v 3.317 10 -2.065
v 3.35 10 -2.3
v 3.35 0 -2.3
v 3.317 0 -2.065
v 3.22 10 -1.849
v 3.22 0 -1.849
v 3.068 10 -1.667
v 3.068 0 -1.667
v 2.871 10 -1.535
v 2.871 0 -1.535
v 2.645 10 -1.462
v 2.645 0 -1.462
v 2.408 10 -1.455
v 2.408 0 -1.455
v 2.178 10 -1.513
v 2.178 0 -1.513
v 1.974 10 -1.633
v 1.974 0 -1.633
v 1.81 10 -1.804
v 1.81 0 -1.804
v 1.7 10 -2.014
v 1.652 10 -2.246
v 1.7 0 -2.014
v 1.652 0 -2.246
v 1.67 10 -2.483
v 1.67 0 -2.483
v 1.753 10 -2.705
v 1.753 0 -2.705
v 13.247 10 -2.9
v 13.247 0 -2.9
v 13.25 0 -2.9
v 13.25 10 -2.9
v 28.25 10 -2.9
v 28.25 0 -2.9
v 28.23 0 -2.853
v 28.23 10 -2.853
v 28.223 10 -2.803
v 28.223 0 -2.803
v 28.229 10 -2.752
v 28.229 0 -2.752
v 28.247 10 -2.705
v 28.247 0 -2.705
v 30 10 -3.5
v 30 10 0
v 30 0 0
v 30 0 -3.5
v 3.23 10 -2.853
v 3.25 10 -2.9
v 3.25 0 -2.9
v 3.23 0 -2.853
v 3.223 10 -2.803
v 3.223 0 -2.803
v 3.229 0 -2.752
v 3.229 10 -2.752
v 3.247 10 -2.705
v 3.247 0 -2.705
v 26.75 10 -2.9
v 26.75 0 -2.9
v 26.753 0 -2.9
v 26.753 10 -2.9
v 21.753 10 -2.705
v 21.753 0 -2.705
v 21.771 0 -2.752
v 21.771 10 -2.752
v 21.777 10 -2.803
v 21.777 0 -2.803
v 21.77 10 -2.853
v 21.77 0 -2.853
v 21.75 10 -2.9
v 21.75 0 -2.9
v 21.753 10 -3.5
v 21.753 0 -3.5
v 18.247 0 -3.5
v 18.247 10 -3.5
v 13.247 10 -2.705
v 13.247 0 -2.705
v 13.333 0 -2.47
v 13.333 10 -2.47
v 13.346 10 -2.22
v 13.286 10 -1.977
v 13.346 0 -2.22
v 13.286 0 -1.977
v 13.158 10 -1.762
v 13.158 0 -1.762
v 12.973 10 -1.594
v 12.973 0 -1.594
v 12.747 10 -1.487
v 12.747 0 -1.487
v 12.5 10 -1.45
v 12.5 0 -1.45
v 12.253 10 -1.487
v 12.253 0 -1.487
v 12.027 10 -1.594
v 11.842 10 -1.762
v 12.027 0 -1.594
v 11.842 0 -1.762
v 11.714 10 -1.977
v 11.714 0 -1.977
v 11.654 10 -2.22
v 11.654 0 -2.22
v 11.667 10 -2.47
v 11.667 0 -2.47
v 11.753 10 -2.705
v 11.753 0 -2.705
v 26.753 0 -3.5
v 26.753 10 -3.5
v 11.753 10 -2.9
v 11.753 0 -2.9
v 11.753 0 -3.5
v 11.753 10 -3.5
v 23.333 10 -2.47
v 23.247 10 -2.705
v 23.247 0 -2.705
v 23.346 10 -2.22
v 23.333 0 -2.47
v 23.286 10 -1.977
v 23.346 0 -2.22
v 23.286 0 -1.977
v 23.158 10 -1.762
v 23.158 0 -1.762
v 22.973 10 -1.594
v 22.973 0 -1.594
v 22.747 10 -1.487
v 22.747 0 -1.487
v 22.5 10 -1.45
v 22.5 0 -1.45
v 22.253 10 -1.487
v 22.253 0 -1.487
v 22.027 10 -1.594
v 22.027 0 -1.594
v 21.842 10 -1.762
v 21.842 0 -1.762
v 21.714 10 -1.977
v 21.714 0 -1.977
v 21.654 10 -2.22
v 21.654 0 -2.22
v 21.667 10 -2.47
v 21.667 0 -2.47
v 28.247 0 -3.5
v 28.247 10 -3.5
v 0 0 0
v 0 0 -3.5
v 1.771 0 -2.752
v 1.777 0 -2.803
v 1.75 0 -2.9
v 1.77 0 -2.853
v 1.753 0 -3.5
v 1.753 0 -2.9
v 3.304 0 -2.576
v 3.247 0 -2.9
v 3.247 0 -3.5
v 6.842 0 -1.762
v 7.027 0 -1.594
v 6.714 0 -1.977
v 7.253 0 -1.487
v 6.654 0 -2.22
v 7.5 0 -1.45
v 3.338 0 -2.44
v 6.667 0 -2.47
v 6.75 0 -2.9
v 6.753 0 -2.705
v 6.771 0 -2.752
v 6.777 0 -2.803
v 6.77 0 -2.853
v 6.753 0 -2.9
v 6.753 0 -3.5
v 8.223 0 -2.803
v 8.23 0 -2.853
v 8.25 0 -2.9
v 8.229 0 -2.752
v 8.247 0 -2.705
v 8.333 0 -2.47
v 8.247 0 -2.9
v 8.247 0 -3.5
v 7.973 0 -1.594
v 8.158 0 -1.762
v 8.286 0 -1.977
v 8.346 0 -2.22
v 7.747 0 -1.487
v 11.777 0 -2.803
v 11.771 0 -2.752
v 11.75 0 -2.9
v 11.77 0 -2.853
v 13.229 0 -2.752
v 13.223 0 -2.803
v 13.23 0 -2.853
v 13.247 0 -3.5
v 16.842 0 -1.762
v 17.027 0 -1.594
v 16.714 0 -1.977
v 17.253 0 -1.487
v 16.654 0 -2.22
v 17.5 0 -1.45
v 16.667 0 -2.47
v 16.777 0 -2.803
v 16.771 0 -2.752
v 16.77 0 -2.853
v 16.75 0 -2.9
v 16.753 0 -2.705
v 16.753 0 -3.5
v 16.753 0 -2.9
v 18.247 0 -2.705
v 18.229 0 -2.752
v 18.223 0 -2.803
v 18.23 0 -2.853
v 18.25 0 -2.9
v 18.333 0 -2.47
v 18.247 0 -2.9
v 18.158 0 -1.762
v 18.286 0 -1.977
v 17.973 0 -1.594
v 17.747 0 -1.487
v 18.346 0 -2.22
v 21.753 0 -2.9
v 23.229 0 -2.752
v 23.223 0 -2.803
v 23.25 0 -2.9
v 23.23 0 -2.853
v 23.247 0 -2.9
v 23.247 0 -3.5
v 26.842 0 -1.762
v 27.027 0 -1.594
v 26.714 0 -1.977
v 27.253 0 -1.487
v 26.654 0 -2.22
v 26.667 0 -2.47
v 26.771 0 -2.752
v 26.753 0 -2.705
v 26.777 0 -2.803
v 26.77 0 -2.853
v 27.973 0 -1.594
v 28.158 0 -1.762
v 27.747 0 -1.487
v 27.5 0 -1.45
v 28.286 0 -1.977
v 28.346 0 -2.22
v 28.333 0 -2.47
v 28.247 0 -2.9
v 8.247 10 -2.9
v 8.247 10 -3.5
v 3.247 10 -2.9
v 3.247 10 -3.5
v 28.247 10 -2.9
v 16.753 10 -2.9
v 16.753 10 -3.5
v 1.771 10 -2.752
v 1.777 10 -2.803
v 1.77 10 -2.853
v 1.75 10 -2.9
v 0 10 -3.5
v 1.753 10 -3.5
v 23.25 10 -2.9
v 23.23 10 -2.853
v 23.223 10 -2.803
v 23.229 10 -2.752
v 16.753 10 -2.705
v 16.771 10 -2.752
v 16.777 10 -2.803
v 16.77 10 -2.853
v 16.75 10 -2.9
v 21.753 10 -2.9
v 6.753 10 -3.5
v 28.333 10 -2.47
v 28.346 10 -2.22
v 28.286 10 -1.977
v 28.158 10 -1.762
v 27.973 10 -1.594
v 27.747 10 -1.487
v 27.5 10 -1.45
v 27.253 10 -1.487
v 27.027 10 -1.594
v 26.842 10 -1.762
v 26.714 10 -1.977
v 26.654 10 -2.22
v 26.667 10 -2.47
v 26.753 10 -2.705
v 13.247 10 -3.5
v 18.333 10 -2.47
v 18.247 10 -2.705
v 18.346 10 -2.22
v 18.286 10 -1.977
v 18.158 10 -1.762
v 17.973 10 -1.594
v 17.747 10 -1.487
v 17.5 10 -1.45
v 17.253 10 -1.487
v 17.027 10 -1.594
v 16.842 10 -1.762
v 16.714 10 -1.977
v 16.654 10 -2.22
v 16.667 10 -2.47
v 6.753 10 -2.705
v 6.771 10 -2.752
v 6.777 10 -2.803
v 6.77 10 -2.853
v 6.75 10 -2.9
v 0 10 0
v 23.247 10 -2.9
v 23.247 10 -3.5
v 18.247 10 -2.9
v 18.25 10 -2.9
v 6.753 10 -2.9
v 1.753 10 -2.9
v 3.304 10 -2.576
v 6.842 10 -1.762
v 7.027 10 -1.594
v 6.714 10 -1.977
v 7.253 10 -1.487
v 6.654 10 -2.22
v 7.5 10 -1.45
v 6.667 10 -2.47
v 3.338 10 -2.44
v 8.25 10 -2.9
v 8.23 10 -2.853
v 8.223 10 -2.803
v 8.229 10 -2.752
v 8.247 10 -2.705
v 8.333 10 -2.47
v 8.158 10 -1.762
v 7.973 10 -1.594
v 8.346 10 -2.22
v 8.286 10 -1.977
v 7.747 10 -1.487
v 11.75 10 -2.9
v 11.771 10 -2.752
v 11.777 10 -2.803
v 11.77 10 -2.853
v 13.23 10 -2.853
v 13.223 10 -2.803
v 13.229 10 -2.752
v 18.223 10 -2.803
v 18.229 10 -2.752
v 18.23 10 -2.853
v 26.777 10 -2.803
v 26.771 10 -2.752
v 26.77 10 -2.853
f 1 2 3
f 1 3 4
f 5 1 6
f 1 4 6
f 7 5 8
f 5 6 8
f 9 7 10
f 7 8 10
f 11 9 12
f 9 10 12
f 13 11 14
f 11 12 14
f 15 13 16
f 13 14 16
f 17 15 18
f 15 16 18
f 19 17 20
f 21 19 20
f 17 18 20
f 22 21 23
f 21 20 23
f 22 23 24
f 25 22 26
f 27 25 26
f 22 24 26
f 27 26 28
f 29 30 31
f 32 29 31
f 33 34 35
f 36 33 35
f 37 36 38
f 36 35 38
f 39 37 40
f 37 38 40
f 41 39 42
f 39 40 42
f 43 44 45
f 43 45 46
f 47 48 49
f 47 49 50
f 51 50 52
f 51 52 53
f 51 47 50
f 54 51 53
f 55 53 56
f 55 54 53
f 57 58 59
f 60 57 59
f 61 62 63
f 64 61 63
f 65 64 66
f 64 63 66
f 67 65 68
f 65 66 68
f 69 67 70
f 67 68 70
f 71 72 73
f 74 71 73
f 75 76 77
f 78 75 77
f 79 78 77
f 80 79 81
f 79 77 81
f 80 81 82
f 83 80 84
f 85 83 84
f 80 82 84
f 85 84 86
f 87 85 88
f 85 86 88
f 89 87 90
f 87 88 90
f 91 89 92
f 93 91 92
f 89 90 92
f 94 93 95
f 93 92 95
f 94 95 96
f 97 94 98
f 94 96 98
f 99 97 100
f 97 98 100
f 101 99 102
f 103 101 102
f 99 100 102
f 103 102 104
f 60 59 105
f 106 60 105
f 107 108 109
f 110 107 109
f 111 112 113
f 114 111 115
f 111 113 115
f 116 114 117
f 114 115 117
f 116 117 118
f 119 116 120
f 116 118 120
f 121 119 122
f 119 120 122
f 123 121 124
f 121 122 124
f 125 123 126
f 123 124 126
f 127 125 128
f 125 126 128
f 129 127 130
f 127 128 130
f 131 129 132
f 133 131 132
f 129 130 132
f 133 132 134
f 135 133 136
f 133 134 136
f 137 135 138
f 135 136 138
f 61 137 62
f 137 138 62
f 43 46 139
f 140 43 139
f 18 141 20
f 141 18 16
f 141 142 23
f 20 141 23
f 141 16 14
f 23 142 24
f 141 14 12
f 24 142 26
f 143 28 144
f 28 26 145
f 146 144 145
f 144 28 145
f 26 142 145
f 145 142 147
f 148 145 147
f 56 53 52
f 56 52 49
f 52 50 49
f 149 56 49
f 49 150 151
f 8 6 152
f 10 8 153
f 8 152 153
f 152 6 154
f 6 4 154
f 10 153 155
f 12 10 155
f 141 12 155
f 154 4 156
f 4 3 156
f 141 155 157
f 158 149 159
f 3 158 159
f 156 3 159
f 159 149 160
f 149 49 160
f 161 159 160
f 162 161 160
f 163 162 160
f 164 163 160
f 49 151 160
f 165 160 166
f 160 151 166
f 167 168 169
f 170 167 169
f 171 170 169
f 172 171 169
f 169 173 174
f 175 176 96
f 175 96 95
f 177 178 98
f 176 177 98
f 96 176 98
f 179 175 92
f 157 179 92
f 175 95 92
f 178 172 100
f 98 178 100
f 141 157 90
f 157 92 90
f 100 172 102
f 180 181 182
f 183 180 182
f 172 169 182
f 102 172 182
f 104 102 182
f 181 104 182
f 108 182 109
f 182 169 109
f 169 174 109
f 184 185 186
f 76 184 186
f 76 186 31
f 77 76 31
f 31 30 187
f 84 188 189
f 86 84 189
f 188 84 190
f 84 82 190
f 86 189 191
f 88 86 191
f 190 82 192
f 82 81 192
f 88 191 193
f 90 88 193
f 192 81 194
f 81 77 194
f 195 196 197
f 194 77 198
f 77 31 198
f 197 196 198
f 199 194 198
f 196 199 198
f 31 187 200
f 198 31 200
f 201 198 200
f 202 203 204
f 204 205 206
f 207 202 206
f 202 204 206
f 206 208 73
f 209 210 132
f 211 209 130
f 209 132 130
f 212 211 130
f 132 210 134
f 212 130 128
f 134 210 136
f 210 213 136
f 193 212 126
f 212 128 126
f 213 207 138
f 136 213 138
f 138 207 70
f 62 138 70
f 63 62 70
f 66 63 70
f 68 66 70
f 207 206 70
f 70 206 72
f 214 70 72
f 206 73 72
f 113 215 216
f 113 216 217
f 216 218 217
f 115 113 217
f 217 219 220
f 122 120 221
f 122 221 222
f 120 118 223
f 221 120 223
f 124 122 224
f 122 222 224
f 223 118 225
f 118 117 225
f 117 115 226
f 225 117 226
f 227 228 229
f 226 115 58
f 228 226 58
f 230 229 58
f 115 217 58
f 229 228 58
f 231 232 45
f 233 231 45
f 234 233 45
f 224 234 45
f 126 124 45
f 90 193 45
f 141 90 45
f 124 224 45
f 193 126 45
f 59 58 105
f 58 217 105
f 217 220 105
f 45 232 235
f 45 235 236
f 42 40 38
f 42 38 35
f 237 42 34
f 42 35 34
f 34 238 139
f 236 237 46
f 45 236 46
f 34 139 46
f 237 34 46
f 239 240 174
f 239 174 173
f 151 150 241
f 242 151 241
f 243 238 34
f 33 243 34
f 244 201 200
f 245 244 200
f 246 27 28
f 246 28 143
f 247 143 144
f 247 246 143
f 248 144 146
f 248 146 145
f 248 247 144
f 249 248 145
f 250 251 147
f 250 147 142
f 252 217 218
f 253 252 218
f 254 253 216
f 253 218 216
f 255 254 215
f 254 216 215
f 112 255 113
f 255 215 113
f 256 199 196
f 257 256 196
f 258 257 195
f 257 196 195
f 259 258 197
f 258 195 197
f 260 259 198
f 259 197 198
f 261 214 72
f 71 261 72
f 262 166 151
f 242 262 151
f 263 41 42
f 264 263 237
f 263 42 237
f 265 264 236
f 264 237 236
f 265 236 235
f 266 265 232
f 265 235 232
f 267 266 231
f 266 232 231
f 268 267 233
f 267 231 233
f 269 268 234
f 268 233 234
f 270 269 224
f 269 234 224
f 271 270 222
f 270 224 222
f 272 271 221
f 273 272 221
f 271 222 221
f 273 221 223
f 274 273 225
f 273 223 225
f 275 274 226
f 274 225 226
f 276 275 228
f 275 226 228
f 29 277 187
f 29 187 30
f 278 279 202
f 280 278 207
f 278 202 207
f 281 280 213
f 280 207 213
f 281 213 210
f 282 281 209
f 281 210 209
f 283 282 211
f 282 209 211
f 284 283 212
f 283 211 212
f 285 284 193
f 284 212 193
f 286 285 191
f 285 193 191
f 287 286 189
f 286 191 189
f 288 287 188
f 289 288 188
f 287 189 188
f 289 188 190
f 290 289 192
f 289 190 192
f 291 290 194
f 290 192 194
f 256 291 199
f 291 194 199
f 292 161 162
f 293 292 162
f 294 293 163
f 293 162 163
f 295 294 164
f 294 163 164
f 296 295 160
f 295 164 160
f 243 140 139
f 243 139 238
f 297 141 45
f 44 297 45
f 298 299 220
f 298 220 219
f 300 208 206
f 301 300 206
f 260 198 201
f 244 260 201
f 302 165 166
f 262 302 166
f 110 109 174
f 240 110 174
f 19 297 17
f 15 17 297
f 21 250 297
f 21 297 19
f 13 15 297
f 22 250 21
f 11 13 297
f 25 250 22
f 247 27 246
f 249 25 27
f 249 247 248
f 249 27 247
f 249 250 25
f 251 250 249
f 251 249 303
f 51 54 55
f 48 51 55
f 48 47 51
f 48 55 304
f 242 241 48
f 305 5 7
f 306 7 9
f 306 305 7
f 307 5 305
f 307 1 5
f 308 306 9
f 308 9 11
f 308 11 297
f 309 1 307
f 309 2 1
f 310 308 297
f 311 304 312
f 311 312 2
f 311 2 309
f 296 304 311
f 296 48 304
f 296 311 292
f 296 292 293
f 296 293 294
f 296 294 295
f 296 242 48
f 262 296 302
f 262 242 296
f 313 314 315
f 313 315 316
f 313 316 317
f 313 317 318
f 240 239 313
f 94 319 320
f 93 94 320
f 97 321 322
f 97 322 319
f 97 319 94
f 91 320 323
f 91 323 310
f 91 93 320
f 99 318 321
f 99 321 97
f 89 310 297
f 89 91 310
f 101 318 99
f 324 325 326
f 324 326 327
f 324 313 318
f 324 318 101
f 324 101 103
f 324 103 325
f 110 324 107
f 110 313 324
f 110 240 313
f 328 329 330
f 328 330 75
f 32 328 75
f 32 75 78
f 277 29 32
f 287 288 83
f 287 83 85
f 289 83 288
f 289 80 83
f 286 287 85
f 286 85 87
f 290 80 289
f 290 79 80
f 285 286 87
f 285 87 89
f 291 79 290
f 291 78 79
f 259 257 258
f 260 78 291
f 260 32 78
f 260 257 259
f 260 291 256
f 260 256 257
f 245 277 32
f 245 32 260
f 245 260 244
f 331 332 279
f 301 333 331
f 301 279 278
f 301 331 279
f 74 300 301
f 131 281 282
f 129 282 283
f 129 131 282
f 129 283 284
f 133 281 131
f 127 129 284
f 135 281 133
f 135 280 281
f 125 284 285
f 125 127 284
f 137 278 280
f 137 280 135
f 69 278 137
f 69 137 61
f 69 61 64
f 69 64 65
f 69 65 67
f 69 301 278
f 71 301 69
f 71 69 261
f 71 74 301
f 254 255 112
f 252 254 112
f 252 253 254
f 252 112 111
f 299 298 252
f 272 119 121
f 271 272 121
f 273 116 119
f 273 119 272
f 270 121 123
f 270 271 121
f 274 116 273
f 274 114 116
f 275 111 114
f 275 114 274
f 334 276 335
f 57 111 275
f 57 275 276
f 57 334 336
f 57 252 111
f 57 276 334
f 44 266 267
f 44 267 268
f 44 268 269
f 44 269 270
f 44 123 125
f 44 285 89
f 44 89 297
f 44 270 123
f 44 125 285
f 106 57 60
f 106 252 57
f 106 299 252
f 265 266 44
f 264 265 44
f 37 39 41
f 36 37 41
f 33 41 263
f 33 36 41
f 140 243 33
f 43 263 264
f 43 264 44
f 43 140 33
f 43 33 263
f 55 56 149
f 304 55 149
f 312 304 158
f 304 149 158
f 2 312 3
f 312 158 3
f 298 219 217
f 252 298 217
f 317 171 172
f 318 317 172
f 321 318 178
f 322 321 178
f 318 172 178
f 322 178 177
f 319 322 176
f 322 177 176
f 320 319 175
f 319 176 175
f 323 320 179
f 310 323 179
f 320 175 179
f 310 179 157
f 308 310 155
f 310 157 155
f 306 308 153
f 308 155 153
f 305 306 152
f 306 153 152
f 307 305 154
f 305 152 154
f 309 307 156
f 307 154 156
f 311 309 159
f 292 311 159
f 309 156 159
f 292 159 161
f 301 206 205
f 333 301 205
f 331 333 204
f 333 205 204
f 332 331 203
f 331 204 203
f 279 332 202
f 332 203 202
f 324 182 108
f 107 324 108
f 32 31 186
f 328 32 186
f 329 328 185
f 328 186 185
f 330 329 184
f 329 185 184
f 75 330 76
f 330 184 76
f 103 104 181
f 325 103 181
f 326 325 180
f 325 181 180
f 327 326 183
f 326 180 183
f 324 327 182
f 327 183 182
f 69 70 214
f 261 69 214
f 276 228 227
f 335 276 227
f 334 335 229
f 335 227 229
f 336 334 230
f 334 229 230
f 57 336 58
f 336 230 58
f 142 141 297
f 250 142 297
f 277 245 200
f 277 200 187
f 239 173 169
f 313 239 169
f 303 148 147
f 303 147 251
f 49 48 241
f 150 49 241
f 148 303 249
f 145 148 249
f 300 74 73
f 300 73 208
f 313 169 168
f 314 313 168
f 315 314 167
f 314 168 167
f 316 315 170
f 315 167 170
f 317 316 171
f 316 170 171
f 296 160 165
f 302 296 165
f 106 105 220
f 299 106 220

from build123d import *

# Parameters (mm, degrees)
BOSS_EXTRUDE1_DEPTH = 10
FILLET1_R           = 0.2
BOSS_EXTRUDE2_START = -0.1
SKETCH2_W           = 1.752559166
SKETCH2_H           = 10
BOSS_EXTRUDE2_DEPTH = 0.6
LPATTERN1_DEPTH     = 10


# Read off the part's stored shape, not the designer's step: LPattern1
with BuildPart() as part:
    # Sketch1 → Boss-Extrude1 (new body)
    with BuildSketch(Plane(origin=(0, 0, 0), x_dir=(1, 0, 0), z_dir=(0, 1, 0))):
        with BuildLine():
            Line((0, 3), (0, 0))
            Line((0, 0), (5, 0))
            Line((5, 0), (5, 3))
            Line((5, 3), (2.982182538, 3))
            ThreePointArc((2.982182538, 3), (3.252447725, 2.695376303), (3.35, 2.3))
            ThreePointArc((3.35, 2.3), (2.104623697, 1.547552275), (2.017817462, 3))
            Line((2.017817462, 3), (0, 3))
        make_face()
    extrude(amount=BOSS_EXTRUDE1_DEPTH)

    # Fillet1
    fillet1_edges = [part.edges().sort_by_distance(p)[0] for p in [
        (2.982182538, 5, -3),
        (2.017817462, 5, -3),
    ]]
    fillet(fillet1_edges, radius=FILLET1_R)

    # Sketch2 → Boss-Extrude2 (add)
    with BuildSketch(Plane(origin=(0, 0, -3), x_dir=(-1, 0, 0), z_dir=(0, 0, -1)).offset(BOSS_EXTRUDE2_START)):
        with Locations((-0.876279583, 5)):
            Rectangle(SKETCH2_W, SKETCH2_H)
        with Locations((-4.123720417, 5)):
            Rectangle(SKETCH2_W, SKETCH2_H)
    extrude(amount=BOSS_EXTRUDE2_DEPTH)

    # LPattern1 outline → LPattern1 (add)
    with BuildSketch(Plane(origin=(0, 0, 0), x_dir=(1, 0, 0), z_dir=(0, 1, 0))):
        with BuildLine():
            ThreePointArc((28.250104185, 2.9), (28.223327872, 2.802728057), (28.247440834, 2.704761905))
            ThreePointArc((28.247440834, 2.704761905), (27.5, 1.45), (26.752559166, 2.704761905))
            ThreePointArc((26.752559166, 2.704761905), (26.776672128, 2.802728057), (26.749895815, 2.9))
            Line((26.749895815, 2.9), (26.752559166, 2.9))
            Line((26.752559166, 2.9), (26.752559166, 3.5))
            Line((26.752559166, 3.5), (23.247440834, 3.5))
            Line((23.247440834, 3.5), (23.247440834, 2.9))
            Line((23.247440834, 2.9), (23.250104185, 2.9))
            ThreePointArc((23.250104185, 2.9), (23.223327872, 2.802728057), (23.247440834, 2.704761905))
            ThreePointArc((23.247440834, 2.704761905), (22.5, 1.45), (21.752559166, 2.704761905))
            ThreePointArc((21.752559166, 2.704761905), (21.776672128, 2.802728057), (21.749895815, 2.9))
            Line((21.749895815, 2.9), (21.752559166, 2.9))
            Line((21.752559166, 2.9), (21.752559166, 3.5))
            Line((21.752559166, 3.5), (18.247440834, 3.5))
            Line((18.247440834, 3.5), (18.247440834, 2.9))
            Line((18.247440834, 2.9), (18.250104185, 2.9))
            ThreePointArc((18.250104185, 2.9), (18.223327872, 2.802728057), (18.247440834, 2.704761905))
            ThreePointArc((18.247440834, 2.704761905), (17.5, 1.45), (16.752559166, 2.704761905))
            ThreePointArc((16.752559166, 2.704761905), (16.776672128, 2.802728057), (16.749895815, 2.9))
            Line((16.749895815, 2.9), (16.752559166, 2.9))
            Line((16.752559166, 2.9), (16.752559166, 3.5))
            Line((16.752559166, 3.5), (13.247440834, 3.5))
            Line((13.247440834, 3.5), (13.247440834, 2.9))
            Line((13.247440834, 2.9), (13.250104185, 2.9))
            ThreePointArc((13.250104185, 2.9), (13.223327872, 2.802728057), (13.247440834, 2.704761905))
            ThreePointArc((13.247440834, 2.704761905), (12.5, 1.45), (11.752559166, 2.704761905))
            ThreePointArc((11.752559166, 2.704761905), (11.776672128, 2.802728057), (11.749895815, 2.9))
            Line((11.749895815, 2.9), (11.752559166, 2.9))
            Line((11.752559166, 2.9), (11.752559166, 3.5))
            Line((11.752559166, 3.5), (8.247440834, 3.5))
            Line((8.247440834, 3.5), (8.247440834, 2.9))
            Line((8.247440834, 2.9), (8.250104185, 2.9))
            ThreePointArc((8.250104185, 2.9), (8.223327872, 2.802728057), (8.247440834, 2.704761905))
            ThreePointArc((8.247440834, 2.704761905), (7.5, 1.45), (6.752559166, 2.704761905))
            ThreePointArc((6.752559166, 2.704761905), (6.776672128, 2.802728057), (6.749895815, 2.9))
            Line((6.749895815, 2.9), (6.752559166, 2.9))
            Line((6.752559166, 2.9), (6.752559166, 3.5))
            Line((6.752559166, 3.5), (5, 3.5))
            Line((5, 3.5), (5, 0))
            Line((5, 0), (30, 0))
            Line((30, 0), (30, 3.5))
            Line((30, 3.5), (28.247440834, 3.5))
            Line((28.247440834, 3.5), (28.247440834, 2.9))
            Line((28.247440834, 2.9), (28.250104185, 2.9))
        make_face()
    extrude(amount=LPATTERN1_DEPTH)


solid = part.part
